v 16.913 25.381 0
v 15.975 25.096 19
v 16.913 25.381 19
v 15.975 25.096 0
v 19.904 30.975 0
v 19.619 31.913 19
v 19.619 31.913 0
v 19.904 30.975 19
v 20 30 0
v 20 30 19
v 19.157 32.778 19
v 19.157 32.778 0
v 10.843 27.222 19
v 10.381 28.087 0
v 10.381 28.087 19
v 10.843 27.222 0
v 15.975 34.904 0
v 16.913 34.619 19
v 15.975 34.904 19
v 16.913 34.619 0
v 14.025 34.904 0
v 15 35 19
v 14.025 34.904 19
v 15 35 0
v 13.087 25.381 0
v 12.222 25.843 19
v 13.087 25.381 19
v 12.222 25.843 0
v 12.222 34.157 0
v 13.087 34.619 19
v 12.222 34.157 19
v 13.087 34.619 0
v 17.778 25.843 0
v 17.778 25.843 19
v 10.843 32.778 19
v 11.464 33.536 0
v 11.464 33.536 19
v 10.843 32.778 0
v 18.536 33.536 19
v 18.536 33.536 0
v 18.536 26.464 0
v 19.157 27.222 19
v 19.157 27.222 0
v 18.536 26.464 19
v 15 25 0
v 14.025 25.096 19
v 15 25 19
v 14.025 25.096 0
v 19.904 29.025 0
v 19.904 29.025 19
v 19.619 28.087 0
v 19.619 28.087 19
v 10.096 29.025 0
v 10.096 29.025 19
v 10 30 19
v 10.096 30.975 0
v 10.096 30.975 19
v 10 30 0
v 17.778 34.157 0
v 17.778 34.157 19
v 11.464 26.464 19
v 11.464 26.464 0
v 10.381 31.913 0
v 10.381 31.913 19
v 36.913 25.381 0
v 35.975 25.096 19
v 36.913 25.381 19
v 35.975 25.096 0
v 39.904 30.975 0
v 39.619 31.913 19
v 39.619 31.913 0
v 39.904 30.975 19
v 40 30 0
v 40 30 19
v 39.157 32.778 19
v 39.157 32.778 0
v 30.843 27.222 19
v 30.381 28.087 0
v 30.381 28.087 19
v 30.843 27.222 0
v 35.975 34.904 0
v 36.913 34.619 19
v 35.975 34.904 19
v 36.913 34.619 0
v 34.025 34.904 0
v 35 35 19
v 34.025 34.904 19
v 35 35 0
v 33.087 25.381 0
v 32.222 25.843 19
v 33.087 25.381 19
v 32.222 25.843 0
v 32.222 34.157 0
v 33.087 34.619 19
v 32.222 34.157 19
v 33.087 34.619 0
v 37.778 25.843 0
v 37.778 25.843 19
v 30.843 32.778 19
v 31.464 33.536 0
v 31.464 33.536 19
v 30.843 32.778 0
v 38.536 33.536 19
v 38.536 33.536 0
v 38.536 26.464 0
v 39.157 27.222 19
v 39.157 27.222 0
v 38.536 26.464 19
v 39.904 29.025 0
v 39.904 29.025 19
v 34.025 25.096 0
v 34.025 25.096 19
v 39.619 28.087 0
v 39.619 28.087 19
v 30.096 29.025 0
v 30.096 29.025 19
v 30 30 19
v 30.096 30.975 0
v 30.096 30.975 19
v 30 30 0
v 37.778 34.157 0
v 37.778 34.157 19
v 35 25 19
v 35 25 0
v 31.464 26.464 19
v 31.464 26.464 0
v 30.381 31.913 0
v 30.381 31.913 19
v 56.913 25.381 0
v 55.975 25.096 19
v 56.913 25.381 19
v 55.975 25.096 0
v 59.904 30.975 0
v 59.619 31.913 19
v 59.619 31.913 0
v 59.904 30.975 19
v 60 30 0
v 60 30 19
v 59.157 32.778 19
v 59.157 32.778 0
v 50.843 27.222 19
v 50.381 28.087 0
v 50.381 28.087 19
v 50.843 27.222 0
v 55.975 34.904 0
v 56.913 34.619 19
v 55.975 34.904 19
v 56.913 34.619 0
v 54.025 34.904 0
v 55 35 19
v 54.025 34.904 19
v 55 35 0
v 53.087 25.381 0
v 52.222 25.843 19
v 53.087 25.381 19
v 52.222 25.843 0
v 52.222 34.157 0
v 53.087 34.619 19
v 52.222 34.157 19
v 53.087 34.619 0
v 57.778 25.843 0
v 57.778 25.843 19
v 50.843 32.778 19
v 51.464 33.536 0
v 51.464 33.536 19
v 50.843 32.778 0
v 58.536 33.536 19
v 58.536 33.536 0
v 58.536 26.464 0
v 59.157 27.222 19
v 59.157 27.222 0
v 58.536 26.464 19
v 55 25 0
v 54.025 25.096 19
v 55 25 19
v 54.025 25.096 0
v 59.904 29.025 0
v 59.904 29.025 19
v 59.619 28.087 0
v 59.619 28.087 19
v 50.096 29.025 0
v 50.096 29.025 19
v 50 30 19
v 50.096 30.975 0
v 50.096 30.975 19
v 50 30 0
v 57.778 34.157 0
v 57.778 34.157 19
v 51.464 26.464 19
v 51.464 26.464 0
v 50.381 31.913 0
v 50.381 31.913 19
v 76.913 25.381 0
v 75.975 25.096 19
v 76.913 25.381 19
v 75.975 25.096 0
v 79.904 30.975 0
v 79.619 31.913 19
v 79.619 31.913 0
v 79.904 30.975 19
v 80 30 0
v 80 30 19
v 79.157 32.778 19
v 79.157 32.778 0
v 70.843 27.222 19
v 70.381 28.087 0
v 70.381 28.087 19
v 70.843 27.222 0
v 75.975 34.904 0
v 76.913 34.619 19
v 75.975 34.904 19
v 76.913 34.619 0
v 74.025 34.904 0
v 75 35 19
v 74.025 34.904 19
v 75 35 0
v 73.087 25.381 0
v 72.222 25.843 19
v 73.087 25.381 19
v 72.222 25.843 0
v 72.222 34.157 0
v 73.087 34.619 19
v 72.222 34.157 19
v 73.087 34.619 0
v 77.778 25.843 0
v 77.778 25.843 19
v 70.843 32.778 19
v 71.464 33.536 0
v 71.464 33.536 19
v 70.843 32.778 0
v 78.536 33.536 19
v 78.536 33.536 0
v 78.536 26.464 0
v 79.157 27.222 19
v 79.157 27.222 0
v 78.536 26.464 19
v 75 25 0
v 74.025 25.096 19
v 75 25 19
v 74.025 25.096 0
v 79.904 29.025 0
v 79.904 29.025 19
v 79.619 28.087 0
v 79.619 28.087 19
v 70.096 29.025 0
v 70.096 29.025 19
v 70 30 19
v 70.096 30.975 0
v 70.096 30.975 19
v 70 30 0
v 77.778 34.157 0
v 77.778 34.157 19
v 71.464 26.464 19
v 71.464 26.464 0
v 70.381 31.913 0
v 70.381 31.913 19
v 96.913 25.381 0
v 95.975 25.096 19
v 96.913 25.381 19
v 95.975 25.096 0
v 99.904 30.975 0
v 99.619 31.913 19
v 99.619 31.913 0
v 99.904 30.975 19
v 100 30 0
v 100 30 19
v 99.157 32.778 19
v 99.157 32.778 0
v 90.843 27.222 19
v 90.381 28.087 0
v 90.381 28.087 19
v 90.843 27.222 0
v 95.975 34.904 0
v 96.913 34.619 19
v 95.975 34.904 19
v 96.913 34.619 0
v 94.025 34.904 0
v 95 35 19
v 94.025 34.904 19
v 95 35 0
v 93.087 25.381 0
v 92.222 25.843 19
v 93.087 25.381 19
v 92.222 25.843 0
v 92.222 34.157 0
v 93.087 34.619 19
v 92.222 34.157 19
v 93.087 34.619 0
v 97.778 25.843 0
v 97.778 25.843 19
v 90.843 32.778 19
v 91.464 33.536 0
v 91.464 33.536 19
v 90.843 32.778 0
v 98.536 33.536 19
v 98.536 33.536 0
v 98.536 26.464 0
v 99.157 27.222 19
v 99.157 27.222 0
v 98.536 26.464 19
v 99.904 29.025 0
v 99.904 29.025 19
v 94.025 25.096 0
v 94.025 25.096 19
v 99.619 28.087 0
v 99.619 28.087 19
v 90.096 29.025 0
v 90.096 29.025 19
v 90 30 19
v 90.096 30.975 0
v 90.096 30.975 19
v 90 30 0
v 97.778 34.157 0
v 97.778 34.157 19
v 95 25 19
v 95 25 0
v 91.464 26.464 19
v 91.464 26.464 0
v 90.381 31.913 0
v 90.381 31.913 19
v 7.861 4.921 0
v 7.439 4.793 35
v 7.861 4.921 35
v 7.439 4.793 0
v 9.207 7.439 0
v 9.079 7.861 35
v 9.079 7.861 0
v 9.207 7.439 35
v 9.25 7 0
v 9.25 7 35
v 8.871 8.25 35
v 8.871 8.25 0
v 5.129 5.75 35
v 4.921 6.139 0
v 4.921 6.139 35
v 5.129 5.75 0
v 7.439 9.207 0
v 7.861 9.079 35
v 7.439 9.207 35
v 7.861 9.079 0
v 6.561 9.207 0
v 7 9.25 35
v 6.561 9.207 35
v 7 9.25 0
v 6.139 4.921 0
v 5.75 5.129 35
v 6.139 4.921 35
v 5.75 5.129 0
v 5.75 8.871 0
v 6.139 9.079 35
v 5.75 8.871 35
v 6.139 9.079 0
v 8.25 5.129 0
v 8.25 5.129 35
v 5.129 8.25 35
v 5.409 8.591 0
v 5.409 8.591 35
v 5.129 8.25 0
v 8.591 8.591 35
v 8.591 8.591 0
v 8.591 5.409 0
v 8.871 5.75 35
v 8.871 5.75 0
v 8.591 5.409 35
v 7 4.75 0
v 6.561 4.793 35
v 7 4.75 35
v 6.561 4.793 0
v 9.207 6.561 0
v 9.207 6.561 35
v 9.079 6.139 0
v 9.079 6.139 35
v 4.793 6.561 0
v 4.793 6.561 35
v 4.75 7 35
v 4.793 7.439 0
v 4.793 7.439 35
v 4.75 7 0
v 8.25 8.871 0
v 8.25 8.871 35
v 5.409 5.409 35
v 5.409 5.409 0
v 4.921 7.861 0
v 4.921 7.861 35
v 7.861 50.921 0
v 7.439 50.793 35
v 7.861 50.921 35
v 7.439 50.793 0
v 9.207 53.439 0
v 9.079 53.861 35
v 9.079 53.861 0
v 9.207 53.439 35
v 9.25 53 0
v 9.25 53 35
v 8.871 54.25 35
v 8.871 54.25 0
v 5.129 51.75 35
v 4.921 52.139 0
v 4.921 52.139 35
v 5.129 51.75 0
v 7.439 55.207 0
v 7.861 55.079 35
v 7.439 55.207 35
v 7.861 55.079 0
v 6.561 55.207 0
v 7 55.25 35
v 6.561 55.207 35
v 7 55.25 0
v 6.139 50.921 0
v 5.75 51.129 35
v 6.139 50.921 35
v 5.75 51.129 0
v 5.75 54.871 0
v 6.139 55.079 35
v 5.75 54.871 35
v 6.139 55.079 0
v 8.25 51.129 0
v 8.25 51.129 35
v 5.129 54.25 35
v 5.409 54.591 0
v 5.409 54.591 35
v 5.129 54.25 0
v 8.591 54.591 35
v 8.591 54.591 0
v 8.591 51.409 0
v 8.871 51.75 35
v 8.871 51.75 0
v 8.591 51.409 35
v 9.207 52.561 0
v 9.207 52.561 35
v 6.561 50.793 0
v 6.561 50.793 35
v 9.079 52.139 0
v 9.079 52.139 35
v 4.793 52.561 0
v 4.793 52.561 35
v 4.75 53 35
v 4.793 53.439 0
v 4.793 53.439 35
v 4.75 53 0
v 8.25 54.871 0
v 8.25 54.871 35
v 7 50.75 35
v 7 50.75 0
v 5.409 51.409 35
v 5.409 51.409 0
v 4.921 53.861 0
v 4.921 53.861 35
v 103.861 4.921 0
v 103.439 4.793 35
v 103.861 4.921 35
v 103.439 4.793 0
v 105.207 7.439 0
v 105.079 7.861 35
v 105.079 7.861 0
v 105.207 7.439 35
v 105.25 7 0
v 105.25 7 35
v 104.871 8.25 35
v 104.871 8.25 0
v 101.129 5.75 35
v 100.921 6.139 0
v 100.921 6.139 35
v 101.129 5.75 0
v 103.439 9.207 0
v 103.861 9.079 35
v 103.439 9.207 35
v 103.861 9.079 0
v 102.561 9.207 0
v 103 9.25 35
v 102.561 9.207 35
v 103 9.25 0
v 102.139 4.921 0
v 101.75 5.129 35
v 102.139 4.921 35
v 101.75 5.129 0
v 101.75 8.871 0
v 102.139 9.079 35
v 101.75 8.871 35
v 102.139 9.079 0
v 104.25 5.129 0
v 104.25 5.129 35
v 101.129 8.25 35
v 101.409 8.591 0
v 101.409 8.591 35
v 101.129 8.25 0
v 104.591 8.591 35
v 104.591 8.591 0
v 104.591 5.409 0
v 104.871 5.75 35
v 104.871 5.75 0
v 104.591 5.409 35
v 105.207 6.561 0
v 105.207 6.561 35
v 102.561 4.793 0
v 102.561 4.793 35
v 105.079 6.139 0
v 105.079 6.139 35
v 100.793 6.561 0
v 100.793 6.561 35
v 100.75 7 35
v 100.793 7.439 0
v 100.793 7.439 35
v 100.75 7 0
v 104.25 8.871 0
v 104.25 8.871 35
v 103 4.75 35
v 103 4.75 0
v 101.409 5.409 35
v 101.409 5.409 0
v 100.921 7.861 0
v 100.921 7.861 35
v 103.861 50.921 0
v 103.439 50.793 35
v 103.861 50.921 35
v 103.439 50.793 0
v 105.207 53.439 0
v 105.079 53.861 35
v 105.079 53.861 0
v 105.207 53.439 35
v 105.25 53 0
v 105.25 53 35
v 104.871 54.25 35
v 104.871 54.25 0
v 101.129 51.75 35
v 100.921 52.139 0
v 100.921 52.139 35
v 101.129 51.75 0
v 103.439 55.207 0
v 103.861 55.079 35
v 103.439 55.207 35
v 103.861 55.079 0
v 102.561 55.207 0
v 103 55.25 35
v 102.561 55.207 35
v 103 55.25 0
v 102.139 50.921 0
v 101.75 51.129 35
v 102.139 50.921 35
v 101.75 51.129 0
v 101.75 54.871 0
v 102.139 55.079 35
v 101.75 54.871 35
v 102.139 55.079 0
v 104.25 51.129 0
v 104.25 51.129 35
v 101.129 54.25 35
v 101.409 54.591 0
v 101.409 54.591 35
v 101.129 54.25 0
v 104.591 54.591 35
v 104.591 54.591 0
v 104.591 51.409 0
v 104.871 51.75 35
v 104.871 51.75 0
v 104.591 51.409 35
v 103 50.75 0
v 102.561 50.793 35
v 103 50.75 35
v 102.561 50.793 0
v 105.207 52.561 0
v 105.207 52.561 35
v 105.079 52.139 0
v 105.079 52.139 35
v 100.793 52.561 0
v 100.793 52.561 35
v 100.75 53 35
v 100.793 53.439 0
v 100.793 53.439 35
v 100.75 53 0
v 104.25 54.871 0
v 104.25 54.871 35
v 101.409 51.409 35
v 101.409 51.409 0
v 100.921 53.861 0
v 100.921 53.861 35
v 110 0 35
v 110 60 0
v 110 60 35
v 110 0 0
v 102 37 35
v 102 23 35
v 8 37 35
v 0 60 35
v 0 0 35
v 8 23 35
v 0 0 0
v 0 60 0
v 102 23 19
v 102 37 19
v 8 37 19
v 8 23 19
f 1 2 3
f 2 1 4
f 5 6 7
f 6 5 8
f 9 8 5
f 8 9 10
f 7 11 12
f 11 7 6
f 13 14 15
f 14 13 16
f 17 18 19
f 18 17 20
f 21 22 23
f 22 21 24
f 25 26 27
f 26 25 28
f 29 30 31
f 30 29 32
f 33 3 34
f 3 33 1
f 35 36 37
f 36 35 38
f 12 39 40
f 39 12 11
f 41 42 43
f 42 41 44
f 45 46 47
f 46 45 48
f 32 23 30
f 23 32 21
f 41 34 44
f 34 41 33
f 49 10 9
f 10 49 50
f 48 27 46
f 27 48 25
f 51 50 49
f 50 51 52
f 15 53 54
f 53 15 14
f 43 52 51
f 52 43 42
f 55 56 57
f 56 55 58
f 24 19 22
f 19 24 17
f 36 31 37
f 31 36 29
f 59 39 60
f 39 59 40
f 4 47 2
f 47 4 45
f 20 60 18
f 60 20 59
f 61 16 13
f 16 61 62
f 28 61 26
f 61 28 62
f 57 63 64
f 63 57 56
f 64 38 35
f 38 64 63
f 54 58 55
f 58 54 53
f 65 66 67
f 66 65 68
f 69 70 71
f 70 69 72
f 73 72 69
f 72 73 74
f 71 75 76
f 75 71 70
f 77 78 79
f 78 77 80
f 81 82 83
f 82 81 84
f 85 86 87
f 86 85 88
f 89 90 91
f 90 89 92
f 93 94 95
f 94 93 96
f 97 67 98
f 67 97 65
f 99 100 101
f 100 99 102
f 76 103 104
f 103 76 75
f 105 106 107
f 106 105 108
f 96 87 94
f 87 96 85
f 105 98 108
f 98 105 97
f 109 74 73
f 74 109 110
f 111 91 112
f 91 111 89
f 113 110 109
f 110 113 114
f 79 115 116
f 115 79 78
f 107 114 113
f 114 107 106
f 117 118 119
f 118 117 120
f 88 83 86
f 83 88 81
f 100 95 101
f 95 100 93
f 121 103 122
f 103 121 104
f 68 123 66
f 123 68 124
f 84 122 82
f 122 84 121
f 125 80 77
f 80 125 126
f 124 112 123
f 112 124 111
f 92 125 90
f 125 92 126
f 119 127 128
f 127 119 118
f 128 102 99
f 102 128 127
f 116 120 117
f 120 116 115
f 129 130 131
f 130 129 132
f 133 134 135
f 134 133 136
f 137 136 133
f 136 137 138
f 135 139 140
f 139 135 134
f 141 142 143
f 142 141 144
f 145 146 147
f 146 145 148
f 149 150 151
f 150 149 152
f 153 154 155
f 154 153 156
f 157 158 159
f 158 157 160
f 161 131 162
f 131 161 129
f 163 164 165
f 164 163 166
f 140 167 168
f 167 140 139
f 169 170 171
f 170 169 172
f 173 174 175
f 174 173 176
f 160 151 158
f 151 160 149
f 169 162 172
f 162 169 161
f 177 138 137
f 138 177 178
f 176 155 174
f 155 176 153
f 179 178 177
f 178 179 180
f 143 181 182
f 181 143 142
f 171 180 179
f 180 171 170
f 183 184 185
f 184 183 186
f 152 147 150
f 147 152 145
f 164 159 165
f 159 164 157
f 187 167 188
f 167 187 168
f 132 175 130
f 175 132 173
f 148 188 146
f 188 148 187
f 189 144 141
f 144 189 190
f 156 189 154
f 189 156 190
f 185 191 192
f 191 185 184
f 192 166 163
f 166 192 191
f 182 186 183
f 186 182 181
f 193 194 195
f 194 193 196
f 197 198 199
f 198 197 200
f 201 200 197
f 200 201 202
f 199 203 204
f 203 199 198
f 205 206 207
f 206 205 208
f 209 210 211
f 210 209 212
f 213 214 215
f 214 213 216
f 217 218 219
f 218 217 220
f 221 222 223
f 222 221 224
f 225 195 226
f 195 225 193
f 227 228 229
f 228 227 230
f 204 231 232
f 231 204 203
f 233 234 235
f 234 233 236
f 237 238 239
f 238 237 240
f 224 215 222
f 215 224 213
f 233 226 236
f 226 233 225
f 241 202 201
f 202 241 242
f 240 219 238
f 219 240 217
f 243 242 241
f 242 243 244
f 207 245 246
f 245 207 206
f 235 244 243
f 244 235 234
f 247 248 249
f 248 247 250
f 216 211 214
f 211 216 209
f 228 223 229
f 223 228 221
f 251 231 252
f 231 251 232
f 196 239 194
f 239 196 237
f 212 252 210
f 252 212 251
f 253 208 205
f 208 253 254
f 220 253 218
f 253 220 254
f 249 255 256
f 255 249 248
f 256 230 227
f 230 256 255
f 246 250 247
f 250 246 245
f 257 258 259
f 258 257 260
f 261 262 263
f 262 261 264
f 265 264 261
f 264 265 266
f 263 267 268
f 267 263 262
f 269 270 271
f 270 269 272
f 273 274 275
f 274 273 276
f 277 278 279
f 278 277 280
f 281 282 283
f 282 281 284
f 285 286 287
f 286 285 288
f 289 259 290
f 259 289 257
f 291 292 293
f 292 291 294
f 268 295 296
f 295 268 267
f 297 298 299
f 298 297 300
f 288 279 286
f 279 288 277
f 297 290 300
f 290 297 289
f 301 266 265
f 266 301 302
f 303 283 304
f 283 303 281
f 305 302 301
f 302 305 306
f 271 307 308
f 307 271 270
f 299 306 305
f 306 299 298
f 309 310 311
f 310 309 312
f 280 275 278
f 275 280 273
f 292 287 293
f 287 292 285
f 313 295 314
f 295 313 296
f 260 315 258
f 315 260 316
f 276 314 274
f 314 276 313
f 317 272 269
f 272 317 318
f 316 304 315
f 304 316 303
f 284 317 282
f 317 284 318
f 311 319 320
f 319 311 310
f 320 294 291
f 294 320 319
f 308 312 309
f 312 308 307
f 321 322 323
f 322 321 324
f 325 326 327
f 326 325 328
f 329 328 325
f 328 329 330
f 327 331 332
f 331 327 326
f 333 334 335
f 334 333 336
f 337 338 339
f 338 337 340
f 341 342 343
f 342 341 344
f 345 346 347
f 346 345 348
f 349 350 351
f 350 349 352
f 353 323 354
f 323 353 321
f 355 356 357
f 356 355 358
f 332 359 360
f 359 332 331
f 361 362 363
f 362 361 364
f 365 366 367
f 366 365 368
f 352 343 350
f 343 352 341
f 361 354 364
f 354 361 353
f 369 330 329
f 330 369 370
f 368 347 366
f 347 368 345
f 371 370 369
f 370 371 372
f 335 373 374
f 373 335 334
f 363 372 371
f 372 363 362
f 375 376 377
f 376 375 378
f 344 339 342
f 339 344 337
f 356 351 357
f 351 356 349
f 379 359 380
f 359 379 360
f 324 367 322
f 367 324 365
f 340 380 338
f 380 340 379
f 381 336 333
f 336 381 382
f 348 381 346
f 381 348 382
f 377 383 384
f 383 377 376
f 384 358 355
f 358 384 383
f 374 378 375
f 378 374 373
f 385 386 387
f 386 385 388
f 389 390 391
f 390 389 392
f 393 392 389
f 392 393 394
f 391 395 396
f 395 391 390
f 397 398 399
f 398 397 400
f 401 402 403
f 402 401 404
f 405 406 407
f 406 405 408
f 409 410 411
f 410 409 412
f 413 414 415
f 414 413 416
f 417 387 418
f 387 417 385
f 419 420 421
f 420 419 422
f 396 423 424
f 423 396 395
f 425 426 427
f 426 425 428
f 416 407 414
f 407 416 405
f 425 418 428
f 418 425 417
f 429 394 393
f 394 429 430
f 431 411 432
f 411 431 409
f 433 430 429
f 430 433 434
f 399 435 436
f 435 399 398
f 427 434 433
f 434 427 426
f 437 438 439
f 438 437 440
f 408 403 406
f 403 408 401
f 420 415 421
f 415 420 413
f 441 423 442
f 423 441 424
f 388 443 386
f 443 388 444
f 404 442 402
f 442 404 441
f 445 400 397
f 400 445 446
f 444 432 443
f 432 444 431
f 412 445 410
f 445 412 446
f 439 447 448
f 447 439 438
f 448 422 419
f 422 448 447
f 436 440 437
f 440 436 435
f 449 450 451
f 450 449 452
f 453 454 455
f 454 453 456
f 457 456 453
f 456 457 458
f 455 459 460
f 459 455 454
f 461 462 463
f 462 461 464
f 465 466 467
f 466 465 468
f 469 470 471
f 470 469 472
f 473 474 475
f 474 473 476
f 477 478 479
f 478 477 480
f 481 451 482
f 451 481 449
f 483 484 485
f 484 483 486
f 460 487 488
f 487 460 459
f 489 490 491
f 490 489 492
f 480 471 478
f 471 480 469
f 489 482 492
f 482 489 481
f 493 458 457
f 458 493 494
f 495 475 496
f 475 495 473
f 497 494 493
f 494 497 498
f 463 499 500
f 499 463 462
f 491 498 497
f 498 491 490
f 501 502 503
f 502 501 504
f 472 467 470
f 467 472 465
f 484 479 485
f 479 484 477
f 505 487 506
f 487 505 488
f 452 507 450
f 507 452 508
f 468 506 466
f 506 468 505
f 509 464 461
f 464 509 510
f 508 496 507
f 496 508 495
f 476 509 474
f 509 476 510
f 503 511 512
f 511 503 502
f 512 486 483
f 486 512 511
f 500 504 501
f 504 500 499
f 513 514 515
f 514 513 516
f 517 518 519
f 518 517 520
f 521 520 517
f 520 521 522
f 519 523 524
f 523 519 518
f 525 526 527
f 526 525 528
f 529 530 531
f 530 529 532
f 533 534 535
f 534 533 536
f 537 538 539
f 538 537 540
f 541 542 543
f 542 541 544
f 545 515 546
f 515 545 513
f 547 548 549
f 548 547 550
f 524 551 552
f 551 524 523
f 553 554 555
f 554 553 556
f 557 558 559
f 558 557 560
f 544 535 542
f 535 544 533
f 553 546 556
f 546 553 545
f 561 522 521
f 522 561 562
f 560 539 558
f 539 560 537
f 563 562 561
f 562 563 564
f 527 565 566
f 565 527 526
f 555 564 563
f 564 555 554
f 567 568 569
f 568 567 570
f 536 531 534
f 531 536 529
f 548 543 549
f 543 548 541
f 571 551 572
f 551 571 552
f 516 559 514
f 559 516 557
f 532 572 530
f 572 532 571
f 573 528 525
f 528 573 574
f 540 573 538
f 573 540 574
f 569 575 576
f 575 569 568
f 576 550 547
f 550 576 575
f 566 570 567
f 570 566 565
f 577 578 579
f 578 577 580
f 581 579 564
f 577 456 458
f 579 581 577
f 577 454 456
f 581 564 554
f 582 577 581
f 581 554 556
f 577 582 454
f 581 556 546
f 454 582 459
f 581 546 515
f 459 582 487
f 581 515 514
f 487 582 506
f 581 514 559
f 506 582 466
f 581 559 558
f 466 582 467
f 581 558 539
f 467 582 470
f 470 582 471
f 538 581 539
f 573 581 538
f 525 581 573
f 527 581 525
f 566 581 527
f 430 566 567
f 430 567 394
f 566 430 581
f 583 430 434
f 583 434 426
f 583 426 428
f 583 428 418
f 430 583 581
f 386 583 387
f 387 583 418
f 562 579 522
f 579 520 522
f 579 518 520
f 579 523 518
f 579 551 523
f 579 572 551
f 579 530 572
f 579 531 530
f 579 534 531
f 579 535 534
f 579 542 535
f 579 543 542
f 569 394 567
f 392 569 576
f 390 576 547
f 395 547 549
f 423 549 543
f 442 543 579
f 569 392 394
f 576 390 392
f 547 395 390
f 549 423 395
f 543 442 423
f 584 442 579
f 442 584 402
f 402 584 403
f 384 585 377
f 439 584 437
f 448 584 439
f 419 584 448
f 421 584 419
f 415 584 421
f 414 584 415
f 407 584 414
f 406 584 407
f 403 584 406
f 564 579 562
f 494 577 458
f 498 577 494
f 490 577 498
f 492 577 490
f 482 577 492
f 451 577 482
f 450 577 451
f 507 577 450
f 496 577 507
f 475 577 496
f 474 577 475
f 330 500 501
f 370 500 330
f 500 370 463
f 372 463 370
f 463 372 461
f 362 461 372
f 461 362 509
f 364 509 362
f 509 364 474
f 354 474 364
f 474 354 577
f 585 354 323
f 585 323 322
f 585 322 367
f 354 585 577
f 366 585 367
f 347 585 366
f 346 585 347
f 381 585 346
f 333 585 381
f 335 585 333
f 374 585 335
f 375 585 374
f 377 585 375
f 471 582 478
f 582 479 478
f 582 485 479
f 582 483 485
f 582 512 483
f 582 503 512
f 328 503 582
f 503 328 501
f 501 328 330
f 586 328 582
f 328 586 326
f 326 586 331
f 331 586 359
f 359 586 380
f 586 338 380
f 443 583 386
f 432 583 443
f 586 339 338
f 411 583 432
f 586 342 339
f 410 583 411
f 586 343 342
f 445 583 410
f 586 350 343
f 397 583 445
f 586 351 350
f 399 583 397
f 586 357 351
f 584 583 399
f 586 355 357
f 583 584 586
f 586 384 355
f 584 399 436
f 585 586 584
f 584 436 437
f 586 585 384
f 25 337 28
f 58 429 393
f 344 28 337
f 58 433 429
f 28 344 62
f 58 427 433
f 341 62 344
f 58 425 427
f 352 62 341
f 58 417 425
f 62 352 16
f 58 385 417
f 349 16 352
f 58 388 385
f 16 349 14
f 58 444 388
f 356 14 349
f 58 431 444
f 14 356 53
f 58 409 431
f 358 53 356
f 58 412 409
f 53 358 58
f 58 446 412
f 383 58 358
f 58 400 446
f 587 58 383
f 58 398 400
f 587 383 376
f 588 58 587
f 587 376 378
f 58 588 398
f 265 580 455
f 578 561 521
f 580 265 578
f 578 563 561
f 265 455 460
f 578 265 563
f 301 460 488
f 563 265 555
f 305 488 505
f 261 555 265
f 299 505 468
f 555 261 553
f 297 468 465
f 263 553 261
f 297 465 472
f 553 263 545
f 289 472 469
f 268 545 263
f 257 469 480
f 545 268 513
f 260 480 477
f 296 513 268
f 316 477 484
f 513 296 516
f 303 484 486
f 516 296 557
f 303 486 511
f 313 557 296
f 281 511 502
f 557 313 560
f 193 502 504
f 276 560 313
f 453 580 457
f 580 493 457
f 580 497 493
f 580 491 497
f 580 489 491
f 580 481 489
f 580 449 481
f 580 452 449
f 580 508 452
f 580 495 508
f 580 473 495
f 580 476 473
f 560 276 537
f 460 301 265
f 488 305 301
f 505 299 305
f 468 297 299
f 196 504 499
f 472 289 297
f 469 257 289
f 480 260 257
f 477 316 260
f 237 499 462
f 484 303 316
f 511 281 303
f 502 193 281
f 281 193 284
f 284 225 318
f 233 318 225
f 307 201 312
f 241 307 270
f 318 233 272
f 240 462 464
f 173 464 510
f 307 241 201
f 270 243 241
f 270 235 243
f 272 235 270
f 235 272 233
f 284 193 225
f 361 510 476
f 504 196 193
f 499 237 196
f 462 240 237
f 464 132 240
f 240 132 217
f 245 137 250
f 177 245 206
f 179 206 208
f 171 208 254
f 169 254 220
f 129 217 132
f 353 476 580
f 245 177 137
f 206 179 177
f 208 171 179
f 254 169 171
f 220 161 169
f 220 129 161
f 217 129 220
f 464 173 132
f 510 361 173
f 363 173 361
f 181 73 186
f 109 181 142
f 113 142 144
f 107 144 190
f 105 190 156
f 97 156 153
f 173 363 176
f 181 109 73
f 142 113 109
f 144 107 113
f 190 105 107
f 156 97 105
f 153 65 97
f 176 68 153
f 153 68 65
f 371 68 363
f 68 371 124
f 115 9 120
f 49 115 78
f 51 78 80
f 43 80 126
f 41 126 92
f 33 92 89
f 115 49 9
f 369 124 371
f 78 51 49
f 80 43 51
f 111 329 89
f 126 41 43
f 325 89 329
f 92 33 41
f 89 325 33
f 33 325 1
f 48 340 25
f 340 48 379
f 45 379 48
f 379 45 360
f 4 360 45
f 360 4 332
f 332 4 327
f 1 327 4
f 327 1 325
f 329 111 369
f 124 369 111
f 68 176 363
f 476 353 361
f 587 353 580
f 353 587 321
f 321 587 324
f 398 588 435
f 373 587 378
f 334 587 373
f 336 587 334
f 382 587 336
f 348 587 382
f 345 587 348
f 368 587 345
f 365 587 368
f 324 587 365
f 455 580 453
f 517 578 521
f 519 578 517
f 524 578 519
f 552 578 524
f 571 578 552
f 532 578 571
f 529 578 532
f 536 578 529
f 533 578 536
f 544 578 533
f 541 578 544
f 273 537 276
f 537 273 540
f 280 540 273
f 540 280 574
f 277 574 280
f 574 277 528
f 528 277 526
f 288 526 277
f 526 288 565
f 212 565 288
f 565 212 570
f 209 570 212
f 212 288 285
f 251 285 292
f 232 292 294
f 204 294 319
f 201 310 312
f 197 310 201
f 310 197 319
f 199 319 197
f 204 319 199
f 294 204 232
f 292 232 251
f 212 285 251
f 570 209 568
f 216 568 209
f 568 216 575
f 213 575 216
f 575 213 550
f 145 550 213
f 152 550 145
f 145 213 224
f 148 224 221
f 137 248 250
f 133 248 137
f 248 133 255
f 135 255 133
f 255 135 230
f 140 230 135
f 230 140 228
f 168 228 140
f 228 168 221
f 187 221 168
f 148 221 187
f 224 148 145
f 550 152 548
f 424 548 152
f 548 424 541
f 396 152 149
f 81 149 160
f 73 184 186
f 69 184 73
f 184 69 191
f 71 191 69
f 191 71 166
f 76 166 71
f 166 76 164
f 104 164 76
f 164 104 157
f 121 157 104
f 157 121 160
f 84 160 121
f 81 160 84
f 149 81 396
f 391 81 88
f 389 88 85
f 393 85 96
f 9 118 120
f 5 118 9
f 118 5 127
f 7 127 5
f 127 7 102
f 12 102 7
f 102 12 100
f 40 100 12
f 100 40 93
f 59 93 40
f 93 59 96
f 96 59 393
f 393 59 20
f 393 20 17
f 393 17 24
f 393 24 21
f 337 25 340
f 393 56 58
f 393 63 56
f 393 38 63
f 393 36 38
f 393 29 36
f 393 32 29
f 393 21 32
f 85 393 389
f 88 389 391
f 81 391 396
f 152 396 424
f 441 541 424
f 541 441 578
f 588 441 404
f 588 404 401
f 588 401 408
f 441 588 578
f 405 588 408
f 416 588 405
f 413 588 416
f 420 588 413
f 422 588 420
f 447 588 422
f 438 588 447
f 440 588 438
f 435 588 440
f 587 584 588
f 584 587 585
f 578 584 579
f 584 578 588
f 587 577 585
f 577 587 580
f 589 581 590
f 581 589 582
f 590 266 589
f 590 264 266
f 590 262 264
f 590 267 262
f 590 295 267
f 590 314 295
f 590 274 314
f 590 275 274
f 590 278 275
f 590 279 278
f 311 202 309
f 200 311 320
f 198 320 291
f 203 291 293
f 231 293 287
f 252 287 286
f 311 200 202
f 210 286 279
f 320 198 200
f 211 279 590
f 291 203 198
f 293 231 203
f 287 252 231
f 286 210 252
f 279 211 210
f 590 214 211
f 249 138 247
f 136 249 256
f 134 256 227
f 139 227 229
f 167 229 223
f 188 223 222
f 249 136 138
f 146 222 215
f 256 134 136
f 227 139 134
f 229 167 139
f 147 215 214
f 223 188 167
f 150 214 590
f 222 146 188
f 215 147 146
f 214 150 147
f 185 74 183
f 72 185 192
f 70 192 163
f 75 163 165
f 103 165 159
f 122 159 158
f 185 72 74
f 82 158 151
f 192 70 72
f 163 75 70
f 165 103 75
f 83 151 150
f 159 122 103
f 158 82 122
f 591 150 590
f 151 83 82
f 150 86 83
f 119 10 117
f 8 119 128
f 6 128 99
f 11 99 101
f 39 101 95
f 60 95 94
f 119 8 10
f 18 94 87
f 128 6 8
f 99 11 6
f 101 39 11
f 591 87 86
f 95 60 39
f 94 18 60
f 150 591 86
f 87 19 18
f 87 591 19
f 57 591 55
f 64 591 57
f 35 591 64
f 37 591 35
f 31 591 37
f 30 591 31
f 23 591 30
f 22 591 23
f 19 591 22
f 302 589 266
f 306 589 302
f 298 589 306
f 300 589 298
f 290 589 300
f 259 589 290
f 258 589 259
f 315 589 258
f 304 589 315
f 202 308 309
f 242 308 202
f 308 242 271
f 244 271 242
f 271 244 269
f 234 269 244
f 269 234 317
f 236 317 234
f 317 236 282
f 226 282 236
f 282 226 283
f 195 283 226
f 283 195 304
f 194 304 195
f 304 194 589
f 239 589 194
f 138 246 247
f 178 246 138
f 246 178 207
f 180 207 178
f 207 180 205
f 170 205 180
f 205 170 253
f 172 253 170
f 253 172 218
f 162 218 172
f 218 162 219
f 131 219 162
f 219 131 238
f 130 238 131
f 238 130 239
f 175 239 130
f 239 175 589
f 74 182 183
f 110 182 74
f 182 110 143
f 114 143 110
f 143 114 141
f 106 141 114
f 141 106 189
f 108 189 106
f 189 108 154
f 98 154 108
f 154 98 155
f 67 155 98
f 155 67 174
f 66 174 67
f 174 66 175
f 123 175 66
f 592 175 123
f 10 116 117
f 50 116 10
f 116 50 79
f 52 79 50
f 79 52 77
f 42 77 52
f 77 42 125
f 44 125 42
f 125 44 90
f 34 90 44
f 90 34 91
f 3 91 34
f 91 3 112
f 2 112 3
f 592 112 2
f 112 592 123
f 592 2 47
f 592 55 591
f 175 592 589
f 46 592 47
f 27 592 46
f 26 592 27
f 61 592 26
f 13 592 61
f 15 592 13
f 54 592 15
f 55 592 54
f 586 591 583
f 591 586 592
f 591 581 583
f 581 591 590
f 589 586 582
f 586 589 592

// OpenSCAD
$fn = 32;

// ----------------------------------------------------------------------
// Manifold block: gallery_top manifold
// ----------------------------------------------------------------------

// --- parameters (mm) ---
block_l = 110;            // block length, X
block_w = 60;             // block width, Y
block_h = 35;             // block height, Z
port_d = 10;              // port bore diameter
port_pitch = 20;          // port pitch along X
gallery_d = 14;           // top gallery width, Y
gallery_depth = 16;       // gallery pocket depth
wall_p = 8;               // gallery end wall thickness, X
mnt_d = 4.5;              // mounting hole diameter
mnt_in = 7;               // mounting hole inset from the edges

n_ports = 5;  // ports in the row
port_x0 = (block_l - (n_ports - 1) * port_pitch) / 2;  // first port X

difference() {
  cube([block_l, block_w, block_h]);
  for (i = [0 : n_ports - 1])
    translate([port_x0 + i * port_pitch, block_w / 2, -1])
      cylinder(h = block_h + 2, d = port_d);
  translate([wall_p, block_w / 2 - gallery_d / 2, block_h - gallery_depth])
    cube([block_l - 2 * wall_p, gallery_d, gallery_depth + 1]);
  for (cx = [mnt_in, block_l - mnt_in])
    for (cy = [mnt_in, block_w - mnt_in])
      translate([cx, cy, -1]) cylinder(h = block_h + 2, d = mnt_d);
}
